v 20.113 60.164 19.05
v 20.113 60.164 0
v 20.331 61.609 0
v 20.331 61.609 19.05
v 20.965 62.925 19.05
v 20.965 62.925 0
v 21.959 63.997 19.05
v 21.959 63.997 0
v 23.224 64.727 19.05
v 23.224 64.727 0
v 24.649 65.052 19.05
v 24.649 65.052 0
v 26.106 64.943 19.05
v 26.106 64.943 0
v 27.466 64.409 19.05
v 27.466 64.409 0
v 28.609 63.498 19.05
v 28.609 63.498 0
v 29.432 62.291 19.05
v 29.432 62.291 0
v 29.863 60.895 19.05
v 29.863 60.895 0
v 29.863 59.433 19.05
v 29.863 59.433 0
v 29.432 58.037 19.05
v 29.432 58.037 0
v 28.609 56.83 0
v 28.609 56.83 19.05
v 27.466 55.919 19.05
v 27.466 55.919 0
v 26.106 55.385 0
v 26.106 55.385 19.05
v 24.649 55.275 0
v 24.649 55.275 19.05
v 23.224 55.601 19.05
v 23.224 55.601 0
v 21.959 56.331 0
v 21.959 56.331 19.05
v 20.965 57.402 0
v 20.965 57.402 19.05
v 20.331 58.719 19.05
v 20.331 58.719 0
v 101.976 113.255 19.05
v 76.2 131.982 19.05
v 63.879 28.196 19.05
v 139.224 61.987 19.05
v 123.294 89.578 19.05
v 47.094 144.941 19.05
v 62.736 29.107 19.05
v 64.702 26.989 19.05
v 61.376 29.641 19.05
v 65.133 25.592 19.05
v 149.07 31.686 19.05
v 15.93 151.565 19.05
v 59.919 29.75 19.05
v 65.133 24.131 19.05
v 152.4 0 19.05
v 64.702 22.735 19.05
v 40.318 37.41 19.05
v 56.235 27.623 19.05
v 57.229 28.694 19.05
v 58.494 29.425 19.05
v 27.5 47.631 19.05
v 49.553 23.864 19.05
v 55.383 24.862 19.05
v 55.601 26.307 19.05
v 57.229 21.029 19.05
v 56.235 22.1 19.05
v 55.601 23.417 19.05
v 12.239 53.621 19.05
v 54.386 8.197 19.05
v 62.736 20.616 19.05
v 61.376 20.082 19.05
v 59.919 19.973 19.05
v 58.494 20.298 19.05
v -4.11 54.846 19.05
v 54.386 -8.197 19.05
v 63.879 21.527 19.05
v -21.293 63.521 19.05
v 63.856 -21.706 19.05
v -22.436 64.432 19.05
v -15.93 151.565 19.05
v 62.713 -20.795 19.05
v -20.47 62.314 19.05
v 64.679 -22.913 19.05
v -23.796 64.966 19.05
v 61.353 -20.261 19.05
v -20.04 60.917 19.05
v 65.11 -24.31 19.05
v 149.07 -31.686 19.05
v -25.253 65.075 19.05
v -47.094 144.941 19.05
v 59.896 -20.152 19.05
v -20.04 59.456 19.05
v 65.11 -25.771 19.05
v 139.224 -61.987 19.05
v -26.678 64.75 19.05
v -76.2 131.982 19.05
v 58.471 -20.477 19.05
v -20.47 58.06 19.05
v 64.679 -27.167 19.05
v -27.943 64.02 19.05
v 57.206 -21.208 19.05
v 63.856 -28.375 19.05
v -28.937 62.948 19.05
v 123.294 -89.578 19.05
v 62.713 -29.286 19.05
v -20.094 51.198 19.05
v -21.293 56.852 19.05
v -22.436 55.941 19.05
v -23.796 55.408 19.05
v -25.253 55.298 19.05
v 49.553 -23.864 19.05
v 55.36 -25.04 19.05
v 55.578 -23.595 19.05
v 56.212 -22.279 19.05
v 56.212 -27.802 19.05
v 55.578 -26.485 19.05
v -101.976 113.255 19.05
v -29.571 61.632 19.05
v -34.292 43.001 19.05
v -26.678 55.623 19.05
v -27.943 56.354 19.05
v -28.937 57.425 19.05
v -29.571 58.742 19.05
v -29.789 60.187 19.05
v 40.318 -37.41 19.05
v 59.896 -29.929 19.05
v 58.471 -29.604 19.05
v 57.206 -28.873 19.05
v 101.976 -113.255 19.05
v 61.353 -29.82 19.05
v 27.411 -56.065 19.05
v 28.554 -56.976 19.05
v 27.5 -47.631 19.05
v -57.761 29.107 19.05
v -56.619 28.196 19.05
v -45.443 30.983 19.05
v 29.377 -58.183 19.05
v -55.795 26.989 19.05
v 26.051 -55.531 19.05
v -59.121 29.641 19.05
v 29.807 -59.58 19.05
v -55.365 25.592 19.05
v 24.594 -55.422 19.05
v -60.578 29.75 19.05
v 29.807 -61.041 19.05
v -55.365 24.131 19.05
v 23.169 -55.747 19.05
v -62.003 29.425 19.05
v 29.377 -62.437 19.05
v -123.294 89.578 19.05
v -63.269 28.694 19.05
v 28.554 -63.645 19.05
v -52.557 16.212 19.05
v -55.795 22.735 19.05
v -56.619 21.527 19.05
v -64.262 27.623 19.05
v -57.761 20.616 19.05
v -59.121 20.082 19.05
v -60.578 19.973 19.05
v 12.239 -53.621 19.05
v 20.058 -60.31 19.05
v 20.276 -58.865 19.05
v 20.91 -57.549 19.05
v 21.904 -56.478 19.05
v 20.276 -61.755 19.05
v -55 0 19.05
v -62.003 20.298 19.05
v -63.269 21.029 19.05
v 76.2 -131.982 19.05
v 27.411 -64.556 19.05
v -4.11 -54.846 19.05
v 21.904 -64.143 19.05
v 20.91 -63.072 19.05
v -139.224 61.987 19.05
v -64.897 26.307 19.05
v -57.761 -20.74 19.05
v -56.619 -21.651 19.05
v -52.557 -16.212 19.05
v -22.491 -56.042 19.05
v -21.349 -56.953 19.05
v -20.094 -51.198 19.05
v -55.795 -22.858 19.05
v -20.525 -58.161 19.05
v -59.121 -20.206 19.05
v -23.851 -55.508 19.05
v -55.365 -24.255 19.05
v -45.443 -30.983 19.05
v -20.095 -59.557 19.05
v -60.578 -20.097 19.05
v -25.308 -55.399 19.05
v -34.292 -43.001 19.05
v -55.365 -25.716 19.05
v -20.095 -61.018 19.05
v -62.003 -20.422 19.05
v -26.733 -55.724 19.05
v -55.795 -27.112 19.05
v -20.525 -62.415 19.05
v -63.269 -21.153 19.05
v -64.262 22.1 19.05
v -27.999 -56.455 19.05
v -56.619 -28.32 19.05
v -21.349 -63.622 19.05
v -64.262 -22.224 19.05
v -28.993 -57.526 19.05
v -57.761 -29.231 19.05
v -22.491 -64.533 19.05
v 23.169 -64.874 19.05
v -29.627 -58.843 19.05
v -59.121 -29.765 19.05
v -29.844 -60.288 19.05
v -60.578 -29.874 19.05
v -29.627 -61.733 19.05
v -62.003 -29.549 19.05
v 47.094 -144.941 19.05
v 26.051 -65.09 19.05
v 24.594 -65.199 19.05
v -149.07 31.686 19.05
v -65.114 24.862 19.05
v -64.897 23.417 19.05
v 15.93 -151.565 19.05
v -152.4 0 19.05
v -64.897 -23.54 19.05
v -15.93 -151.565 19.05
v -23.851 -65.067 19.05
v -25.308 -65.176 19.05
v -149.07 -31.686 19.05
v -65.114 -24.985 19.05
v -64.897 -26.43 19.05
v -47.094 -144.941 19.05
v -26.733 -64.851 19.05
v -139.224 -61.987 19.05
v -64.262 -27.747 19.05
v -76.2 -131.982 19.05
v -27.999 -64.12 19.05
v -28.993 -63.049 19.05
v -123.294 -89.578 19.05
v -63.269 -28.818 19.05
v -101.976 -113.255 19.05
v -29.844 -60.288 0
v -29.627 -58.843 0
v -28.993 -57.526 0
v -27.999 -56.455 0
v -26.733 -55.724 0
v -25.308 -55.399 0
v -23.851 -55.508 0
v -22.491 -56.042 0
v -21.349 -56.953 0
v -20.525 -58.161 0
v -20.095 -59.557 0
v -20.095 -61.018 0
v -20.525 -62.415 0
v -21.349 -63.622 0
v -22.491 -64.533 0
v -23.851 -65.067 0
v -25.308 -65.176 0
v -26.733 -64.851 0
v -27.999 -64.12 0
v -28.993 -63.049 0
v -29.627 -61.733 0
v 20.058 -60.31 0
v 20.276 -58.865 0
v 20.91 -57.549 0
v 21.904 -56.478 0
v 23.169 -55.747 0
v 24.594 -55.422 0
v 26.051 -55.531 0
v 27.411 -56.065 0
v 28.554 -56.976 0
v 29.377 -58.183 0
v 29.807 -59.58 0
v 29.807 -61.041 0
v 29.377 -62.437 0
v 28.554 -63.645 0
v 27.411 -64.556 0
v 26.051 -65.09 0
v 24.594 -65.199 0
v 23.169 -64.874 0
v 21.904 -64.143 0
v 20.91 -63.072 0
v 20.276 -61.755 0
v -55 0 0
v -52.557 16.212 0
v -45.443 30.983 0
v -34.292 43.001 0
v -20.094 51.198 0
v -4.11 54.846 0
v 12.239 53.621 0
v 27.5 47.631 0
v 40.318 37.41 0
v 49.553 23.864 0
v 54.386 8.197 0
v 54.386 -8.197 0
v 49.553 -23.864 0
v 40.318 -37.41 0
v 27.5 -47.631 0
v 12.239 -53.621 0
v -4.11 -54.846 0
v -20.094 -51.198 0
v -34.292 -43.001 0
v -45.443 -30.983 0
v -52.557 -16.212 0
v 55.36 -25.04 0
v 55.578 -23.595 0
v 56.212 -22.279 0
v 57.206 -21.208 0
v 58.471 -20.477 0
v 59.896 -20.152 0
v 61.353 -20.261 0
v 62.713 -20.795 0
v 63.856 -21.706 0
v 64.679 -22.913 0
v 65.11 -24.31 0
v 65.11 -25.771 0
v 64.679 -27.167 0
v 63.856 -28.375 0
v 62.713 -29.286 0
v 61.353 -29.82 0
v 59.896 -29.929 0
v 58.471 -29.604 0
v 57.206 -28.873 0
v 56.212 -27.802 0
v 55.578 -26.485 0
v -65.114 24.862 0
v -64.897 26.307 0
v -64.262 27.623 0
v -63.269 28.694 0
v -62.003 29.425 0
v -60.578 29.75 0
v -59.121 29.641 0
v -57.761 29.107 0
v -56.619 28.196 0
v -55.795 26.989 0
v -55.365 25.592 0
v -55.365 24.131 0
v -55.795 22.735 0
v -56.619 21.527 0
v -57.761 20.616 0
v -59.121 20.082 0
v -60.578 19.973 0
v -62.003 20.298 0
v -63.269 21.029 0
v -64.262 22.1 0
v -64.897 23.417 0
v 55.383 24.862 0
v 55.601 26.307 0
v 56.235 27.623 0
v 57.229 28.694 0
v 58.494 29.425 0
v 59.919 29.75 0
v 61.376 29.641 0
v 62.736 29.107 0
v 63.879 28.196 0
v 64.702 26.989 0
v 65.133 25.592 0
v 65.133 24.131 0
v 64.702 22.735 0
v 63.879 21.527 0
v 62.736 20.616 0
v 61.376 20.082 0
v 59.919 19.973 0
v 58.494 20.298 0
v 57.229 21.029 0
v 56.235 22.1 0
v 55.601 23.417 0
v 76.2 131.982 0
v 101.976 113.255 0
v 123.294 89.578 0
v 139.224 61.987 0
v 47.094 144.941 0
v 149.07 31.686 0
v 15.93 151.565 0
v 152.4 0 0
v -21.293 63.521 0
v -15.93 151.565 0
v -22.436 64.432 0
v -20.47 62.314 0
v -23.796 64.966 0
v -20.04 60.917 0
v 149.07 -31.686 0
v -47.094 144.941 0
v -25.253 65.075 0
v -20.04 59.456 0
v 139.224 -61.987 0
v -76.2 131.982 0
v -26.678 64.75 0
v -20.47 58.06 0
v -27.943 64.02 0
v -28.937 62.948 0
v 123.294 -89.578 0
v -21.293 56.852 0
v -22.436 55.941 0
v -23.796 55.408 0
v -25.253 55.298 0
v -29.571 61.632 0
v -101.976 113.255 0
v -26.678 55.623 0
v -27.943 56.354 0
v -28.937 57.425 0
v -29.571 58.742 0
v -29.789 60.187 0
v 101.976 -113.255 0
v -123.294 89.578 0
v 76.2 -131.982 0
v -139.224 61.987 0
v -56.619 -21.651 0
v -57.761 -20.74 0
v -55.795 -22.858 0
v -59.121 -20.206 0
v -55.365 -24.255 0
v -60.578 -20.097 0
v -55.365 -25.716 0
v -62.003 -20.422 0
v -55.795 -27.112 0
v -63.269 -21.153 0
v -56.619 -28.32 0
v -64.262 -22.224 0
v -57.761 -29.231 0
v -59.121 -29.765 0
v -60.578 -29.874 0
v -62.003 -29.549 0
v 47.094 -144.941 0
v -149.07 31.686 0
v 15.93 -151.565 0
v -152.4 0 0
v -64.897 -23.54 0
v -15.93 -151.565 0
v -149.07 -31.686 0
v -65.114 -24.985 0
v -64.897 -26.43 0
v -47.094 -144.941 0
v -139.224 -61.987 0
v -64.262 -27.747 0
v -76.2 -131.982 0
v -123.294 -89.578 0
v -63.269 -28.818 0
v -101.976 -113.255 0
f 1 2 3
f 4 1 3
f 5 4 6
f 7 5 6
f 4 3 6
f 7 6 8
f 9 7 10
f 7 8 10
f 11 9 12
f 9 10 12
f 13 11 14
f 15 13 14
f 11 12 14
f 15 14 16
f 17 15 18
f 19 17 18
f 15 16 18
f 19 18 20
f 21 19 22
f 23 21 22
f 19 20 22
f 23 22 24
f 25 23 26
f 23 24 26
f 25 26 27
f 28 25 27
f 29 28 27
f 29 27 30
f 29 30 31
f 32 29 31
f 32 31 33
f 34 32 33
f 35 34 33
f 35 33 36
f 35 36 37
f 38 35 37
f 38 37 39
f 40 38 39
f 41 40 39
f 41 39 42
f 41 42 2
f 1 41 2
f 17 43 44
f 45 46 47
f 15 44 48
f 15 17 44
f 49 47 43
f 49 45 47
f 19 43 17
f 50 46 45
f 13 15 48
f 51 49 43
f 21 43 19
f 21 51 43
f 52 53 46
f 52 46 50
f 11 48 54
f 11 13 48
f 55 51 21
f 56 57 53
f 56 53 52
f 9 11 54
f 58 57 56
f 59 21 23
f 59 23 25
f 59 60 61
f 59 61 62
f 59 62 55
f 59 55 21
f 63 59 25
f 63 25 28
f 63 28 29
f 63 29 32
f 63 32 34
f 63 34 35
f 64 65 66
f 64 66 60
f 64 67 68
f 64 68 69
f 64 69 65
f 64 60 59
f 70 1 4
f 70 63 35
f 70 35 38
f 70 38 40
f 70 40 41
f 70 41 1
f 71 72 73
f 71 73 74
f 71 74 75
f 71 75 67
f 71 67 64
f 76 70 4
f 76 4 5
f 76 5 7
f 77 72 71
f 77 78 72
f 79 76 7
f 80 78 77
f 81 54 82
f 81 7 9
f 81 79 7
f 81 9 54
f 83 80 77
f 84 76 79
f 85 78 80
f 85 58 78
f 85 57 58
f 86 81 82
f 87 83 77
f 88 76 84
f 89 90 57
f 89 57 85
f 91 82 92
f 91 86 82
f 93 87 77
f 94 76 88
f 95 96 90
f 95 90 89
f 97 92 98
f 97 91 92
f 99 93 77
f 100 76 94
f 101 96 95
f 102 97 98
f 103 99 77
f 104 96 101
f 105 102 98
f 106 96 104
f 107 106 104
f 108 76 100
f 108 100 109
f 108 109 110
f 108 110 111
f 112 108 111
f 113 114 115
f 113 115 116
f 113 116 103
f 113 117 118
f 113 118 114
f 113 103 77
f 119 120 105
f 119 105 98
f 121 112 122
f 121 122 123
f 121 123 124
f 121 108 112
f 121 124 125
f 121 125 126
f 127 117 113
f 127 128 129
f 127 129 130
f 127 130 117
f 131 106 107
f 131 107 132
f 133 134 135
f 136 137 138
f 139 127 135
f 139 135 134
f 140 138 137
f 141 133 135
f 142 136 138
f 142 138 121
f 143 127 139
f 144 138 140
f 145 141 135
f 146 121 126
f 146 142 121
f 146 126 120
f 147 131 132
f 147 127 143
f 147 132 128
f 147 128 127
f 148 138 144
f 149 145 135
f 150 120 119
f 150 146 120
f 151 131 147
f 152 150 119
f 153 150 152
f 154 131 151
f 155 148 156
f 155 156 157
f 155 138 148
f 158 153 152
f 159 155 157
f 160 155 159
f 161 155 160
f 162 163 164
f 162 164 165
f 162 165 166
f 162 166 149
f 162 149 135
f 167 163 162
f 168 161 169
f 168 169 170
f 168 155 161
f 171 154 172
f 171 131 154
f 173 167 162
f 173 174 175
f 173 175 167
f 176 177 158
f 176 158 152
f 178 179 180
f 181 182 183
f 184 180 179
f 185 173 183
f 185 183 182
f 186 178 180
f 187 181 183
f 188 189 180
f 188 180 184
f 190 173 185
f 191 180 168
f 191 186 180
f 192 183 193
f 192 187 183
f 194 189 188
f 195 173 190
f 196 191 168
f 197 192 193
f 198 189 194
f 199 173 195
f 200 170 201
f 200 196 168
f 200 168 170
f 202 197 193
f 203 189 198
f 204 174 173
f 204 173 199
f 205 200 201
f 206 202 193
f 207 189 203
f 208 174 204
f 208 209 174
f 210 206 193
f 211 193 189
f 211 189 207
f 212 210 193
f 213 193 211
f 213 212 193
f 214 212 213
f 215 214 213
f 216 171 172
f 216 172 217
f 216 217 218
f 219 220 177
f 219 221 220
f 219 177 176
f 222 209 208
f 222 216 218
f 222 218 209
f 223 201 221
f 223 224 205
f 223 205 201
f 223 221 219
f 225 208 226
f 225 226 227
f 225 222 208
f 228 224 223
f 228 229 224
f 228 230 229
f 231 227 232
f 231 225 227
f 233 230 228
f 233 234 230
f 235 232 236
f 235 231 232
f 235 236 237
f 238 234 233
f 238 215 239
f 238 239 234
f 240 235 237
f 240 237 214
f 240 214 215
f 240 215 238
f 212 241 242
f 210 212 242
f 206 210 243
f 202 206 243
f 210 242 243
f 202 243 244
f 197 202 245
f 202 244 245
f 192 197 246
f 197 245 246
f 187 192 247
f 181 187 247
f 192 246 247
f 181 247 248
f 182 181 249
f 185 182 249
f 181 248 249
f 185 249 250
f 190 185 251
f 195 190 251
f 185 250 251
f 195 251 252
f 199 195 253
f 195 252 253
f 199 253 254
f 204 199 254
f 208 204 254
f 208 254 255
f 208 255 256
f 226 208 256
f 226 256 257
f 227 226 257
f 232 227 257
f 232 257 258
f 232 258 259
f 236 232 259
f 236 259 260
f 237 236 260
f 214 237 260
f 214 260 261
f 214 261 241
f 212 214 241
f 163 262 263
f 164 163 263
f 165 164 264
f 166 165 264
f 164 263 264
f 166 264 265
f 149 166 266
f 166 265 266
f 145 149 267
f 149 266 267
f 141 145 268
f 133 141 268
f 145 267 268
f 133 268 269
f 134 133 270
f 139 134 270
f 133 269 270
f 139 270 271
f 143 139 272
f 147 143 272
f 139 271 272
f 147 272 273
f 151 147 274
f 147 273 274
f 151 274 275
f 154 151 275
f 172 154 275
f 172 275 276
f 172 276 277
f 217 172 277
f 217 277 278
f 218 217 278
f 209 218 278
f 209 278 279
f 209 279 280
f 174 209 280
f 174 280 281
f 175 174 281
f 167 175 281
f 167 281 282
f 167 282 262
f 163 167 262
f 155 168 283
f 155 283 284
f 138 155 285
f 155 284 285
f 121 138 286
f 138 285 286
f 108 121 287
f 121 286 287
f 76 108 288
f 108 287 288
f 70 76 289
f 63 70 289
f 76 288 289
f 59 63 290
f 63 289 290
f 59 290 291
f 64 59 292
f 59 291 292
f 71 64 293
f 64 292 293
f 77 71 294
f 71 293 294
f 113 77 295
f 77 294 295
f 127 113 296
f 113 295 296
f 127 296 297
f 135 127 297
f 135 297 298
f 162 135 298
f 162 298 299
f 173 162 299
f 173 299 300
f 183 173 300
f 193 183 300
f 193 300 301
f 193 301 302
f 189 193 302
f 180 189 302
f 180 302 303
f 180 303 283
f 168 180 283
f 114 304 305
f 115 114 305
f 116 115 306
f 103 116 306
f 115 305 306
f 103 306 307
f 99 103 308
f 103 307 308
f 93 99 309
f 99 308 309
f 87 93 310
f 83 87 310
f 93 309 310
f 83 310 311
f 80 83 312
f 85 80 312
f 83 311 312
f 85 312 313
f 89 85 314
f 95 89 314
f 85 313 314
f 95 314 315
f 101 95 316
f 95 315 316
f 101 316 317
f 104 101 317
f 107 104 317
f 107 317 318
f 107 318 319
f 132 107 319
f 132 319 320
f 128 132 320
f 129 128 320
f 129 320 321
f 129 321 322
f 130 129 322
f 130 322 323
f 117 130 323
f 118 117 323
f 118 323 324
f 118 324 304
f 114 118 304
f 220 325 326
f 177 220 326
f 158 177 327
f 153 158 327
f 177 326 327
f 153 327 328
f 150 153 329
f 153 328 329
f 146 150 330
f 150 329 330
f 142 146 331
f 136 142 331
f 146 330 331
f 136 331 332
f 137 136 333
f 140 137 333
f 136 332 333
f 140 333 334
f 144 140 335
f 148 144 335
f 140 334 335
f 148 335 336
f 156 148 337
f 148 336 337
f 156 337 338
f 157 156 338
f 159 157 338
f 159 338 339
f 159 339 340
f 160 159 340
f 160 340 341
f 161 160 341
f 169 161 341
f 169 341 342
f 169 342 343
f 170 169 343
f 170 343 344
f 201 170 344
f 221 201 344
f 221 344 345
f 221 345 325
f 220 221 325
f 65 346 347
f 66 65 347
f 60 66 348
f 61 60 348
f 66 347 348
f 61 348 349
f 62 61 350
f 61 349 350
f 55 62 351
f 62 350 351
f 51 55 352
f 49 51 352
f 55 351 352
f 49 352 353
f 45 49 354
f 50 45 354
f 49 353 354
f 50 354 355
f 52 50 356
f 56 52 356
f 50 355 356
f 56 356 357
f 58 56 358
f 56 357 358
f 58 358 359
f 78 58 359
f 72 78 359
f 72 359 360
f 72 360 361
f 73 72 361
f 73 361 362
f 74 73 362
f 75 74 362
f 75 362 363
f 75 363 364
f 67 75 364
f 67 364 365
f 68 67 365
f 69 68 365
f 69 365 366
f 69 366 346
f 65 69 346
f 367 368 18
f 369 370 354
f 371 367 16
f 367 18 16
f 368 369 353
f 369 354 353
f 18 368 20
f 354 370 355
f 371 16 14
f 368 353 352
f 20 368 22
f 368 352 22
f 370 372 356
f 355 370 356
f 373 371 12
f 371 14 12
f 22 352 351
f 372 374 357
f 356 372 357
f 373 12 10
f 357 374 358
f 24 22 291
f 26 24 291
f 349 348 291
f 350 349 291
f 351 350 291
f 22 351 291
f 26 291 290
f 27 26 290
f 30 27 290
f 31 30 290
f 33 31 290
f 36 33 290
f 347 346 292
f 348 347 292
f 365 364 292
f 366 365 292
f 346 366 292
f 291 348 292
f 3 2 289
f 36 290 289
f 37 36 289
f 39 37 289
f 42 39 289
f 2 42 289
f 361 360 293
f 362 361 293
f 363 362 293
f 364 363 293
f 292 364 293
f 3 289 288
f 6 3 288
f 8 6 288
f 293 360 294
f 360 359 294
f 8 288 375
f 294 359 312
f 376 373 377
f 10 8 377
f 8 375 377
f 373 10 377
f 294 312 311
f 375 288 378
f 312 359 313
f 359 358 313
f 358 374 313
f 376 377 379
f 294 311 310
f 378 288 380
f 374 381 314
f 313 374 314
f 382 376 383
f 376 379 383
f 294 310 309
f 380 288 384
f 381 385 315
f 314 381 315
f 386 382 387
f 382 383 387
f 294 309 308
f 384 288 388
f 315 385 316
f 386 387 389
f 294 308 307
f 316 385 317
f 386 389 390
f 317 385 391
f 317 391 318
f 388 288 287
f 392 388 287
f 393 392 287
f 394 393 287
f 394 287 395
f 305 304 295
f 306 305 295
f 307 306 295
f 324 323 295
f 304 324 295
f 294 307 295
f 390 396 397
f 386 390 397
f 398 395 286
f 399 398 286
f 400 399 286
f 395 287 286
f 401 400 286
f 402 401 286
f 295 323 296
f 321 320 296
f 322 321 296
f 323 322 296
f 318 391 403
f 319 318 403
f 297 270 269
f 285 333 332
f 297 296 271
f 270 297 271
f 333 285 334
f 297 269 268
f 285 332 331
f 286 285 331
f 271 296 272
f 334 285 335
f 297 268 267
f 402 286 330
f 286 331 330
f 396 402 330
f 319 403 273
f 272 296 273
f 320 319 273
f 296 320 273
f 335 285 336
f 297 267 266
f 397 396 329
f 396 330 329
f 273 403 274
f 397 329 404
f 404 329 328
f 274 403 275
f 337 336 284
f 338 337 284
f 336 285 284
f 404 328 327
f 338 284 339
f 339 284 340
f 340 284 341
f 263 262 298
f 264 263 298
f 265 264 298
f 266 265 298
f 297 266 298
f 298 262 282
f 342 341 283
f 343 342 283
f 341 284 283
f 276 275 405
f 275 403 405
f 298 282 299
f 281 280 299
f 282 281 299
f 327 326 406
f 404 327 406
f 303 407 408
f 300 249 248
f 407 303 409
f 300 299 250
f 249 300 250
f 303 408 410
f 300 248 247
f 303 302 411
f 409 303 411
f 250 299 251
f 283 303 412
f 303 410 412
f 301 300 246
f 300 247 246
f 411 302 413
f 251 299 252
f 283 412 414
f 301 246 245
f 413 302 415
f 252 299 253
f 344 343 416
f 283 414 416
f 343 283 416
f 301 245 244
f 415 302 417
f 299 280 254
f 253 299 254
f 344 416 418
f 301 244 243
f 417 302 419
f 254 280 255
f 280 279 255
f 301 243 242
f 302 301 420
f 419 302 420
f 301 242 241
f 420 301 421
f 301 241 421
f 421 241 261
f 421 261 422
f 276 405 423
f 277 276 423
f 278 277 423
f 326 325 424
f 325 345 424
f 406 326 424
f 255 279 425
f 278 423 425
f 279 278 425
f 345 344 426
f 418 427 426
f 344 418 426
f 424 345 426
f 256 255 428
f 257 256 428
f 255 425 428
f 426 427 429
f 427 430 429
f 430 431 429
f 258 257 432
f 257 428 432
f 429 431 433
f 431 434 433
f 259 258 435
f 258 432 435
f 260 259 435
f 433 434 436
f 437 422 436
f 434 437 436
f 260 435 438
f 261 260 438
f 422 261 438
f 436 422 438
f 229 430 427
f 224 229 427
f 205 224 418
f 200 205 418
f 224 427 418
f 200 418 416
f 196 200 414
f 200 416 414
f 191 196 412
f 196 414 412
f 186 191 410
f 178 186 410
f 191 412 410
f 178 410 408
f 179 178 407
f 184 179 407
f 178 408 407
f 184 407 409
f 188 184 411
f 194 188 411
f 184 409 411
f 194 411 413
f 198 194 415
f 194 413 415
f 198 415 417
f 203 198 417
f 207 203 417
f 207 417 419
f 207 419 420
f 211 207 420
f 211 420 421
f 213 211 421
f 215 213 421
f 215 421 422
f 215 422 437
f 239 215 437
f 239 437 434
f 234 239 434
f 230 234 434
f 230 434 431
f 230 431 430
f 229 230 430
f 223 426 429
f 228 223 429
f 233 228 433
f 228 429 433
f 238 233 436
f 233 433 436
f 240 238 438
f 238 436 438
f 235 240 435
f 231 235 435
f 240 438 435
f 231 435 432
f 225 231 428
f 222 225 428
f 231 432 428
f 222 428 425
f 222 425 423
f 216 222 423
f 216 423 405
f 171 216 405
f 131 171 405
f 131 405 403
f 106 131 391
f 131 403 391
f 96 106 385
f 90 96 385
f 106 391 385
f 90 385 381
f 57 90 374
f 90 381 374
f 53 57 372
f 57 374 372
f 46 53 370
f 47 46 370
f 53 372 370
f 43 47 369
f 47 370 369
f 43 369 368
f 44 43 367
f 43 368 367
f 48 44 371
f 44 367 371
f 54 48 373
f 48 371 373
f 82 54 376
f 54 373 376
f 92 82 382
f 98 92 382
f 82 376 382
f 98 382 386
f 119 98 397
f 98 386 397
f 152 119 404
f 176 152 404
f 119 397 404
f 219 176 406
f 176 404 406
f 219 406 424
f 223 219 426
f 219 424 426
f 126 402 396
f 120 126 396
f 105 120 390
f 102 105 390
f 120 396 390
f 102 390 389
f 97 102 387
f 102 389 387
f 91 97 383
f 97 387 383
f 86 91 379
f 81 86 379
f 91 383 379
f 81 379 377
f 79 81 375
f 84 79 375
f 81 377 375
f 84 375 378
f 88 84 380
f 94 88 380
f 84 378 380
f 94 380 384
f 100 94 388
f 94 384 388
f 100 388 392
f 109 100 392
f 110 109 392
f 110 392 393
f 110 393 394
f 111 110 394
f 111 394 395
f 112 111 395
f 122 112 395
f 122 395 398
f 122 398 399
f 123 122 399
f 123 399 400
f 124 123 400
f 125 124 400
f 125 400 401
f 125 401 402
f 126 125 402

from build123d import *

# Parameters (mm, degrees)
SKETCH1_R               = 152.4
BOSS_EXTRUDE1_DEPTH     = 19.05
SKETCH5_R               = 55
CUT_EXTRUDE1_DEPTH      = 217.366407975
F_3_8_CLEARANCE_HOLE1_D = 9.8044


with BuildPart() as part:
    # Sketch1 → Boss-Extrude1 (new body)
    with BuildSketch(Plane.XY):
        with Locations(Location((0, 0, 0), (0, 0, 180))):
            Circle(SKETCH1_R)
    extrude(amount=BOSS_EXTRUDE1_DEPTH)

    # Sketch5 → Cut-Extrude1 (cut, through all)
    with BuildSketch(Plane(origin=(0, 0, 0), x_dir=(-1, 0, 0), z_dir=(0, 0, -1))):
        Circle(SKETCH5_R)
    extrude(amount=-CUT_EXTRUDE1_DEPTH, mode=Mode.SUBTRACT)

    # 3/8 Clearance Hole1 (through all)
    with Locations(Plane.XY.offset(19.05)):
        with Locations((60.285109168, 24.861699689), (60.262270723, -25.040419345), (-24.942124319, -60.287558469), (-60.212101884, -24.985282473), (24.959994735, -60.310396903), (-60.212101884, 24.861699689), (-24.88698742, 60.186814133), (25.015131626, 60.163975676)):
            Hole(F_3_8_CLEARANCE_HOLE1_D / 2)


solid = part.part
